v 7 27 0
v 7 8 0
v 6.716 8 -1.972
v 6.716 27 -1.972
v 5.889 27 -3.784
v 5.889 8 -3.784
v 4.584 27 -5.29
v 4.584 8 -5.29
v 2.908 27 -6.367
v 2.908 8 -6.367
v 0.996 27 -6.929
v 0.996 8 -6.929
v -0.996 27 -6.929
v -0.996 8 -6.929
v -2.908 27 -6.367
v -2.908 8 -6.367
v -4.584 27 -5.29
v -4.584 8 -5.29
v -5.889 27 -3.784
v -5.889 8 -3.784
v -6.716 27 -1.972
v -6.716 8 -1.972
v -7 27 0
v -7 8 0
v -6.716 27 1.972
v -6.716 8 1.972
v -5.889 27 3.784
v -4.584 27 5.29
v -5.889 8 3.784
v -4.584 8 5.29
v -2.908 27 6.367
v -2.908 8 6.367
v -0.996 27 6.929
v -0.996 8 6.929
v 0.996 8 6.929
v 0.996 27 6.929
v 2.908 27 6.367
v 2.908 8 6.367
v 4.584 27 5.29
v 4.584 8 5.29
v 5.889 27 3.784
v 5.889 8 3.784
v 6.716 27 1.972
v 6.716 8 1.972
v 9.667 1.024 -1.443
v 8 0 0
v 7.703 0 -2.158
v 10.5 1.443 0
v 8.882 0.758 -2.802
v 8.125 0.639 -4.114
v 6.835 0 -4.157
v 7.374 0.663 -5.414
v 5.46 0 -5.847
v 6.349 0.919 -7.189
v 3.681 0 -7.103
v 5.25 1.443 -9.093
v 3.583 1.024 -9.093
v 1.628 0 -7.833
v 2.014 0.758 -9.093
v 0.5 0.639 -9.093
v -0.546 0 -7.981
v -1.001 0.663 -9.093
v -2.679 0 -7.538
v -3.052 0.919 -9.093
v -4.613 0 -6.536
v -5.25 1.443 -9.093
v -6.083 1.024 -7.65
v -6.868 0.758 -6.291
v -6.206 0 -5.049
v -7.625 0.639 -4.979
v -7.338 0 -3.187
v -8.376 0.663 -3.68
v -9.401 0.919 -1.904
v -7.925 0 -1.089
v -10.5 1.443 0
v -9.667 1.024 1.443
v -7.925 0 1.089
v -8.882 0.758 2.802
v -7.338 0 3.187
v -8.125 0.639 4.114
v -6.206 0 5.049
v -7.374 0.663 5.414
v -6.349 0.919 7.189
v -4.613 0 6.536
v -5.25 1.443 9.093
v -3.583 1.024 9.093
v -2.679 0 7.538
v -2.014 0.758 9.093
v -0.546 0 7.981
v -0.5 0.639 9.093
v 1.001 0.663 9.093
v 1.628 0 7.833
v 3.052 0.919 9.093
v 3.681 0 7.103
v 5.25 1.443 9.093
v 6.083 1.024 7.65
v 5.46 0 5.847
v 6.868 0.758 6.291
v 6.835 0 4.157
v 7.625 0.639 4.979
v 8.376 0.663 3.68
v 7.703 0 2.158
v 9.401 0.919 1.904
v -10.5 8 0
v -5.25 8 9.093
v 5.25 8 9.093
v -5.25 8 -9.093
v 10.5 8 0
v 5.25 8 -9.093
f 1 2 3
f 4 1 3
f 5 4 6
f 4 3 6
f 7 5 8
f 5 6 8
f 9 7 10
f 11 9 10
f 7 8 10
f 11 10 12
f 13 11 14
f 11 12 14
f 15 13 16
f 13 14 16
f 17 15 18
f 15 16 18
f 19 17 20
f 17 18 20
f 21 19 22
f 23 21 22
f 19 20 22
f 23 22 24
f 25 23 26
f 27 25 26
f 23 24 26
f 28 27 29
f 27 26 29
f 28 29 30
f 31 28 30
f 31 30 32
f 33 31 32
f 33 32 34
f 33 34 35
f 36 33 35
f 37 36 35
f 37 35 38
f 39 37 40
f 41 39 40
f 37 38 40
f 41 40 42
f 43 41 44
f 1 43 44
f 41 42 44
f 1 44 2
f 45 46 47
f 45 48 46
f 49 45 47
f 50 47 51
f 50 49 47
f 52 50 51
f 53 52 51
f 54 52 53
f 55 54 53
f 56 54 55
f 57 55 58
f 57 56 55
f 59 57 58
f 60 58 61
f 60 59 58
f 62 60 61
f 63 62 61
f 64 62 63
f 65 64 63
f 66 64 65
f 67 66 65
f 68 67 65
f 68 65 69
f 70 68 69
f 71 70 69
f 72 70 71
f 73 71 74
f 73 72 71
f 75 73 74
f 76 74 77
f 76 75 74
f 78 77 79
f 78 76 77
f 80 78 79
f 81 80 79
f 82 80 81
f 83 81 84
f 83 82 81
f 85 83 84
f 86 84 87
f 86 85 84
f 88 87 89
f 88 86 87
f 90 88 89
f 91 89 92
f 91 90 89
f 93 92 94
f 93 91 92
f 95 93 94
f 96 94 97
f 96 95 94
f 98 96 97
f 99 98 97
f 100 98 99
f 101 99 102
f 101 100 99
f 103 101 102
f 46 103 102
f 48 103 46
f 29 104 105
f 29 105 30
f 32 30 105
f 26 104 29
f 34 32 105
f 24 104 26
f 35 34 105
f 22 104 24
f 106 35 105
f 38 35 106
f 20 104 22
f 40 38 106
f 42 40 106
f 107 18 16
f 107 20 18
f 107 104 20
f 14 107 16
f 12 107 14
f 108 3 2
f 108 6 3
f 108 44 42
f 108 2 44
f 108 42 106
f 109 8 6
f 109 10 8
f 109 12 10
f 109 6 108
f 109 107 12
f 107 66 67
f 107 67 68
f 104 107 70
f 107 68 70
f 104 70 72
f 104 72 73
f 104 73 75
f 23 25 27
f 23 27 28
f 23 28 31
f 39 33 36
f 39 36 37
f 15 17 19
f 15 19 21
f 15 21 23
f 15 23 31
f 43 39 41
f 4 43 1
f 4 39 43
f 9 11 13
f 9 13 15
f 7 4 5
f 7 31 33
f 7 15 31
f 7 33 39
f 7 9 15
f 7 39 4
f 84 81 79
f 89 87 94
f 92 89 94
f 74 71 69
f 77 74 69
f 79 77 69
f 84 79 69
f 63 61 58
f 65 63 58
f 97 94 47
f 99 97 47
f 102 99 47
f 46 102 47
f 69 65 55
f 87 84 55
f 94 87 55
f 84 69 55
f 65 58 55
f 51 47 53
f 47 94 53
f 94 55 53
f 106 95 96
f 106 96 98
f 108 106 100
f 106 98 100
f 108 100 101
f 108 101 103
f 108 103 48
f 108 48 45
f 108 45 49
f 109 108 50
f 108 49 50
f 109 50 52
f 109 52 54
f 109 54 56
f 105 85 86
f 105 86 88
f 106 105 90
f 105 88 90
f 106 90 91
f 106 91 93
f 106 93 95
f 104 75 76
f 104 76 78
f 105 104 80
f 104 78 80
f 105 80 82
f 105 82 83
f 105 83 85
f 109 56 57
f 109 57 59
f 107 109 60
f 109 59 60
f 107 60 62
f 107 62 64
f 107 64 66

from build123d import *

# Parameters (mm, degrees)
EXTRUDE_1_DEPTH     = 8
SKETCH_2_R          = 7
EXTRUDE_2_DEPTH     = 19
SKETCH_3_OUTSIDE_W  = 35.944
SKETCH_3_OUTSIDE_H  = 33.13
SKETCH_3_OUTSIDE_R  = 8
CUT_EXTRUDE_2_DEPTH = 1.5
CUT_EXTRUDE_2_TAPER = 60


with BuildPart() as part:
    # Эскиз1 → Бобышка-Вытянуть1 (new body)
    with BuildSketch(Plane(origin=(0, 0, 0), x_dir=(1, 0, 0), z_dir=(0, 1, 0))):
        Polygon((10.5, 0), (5.25, 9.09326674), (-5.25, 9.09326674), (-10.5, 0), (-5.25, -9.09326674), (5.25, -9.09326674), align=None)
    extrude(amount=EXTRUDE_1_DEPTH)

    # Эскиз2 → Бобышка-Вытянуть2 (add)
    with BuildSketch(Plane(origin=(0, 8, 0), x_dir=(1, 0, 0), z_dir=(0, 1, 0))):
        Circle(SKETCH_2_R)
    extrude(amount=EXTRUDE_2_DEPTH)

    # Эскиз3 outside → Вырез-Вытянуть2 (cut)
    with BuildSketch(Plane.XZ):
        Rectangle(SKETCH_3_OUTSIDE_W, SKETCH_3_OUTSIDE_H)
        Circle(SKETCH_3_OUTSIDE_R, mode=Mode.SUBTRACT)
    extrude(amount=-CUT_EXTRUDE_2_DEPTH, taper=CUT_EXTRUDE_2_TAPER, mode=Mode.SUBTRACT)


solid = part.part
